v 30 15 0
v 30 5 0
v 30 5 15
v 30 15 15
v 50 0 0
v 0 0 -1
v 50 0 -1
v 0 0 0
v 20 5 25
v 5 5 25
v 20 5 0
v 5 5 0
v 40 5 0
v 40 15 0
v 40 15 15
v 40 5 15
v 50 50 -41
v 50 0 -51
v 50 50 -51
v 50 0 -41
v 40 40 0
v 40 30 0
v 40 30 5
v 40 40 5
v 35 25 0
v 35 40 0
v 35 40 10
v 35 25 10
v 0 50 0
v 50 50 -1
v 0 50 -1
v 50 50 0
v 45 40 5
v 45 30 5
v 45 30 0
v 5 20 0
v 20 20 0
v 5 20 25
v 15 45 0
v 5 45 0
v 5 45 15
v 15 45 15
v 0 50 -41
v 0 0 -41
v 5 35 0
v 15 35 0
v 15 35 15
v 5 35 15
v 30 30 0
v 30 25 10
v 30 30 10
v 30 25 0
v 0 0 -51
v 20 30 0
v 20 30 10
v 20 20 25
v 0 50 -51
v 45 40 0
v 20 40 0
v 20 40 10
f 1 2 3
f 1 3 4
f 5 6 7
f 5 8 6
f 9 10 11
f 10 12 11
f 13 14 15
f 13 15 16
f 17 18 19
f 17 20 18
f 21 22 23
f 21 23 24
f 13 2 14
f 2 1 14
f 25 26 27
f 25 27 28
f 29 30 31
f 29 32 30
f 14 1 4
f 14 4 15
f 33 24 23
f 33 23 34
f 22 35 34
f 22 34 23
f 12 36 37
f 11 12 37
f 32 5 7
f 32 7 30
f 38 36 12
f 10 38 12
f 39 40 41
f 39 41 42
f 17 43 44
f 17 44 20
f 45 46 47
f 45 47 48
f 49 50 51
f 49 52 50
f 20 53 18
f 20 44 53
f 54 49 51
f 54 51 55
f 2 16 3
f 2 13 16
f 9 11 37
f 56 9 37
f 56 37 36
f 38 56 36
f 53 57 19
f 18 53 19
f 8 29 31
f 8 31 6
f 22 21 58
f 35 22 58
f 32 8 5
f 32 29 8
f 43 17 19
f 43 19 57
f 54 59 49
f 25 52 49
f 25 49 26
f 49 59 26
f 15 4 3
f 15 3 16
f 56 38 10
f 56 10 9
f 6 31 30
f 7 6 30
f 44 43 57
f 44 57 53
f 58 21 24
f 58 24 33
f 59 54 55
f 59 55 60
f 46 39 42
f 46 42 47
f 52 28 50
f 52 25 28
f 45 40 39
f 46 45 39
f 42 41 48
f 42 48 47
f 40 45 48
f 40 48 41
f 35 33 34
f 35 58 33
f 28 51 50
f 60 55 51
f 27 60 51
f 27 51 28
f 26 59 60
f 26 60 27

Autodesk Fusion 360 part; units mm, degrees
sketch "Skizze1" plane through (0, 0, 0) normal (0, 0, 1) x (1, 0, 0)
  line L0 (0, 0) -> (50, 0)
  line L1 (50, 0) -> (50, 50)
  line L2 (50, 50) -> (0, 50)
  line L3 (0, 50) -> (0, 0)
  line L4 (20, 20) -> (5, 20)
  line L5 (5, 20) -> (5, 5)
  line L6 (5, 5) -> (20, 5)
  line L7 (20, 5) -> (20, 20)
  line L8 (20, 40) -> (35, 40)
  line L9 (35, 40) -> (35, 25)
  line L10 (35, 25) -> (30, 25)
  line L11 (30, 25) -> (30, 30)
  line L12 (30, 30) -> (20, 30)
  line L13 (20, 30) -> (20, 40)
  line L14 (5, 45) -> (15, 45)
  line L15 (15, 45) -> (15, 35)
  line L16 (15, 35) -> (5, 35)
  line L17 (5, 35) -> (5, 45)
  line L18 (30, 15) -> (40, 15)
  line L19 (40, 15) -> (40, 5)
  line L20 (40, 5) -> (30, 5)
  line L21 (30, 5) -> (30, 15)
  line L22 (40, 40) -> (45, 40)
  line L23 (45, 40) -> (45, 30)
  line L24 (45, 30) -> (40, 30)
  line L25 (40, 30) -> (40, 40)
extrude "Extrusion1" add sketch "Skizze1" along normal blind 25 contours L4 L5 L6 L7 makes body 1 in component "Großer Block"
extrude "Extrusion1'" add sketch "Skizze1" along normal blind 15 separate body contours L18 L19 L20 L21 makes body 2 in component "Medium Block 1"
extrude "Extrusion1''" add sketch "Skizze1" along normal blind 15 separate body contours L14 L15 L16 L17 makes body 3 in component "Medium Block 2#"
extrude "Extrusion1'''" add sketch "Skizze1" along normal blind 10 separate body contours L8 L9 L10 L11 L12 L13 makes body 4 in component "L Block"
extrude "Extrusion1''''" add sketch "Skizze1" along normal blind 5 separate body contours L22 L23 L24 L25 makes body 5 in component "Smal Block 1"
extrude "Extrusion1'''''" add sketch "Skizze1" against normal blind 1 separate body contours L0 L1 L2 L3 | L4 L5 L6 L7 | L8 L9 L10 L11 L12 L13 | L14 L15 L16 L17 | L18 L19 L20 L21 | L22 L23 L24 L25 makes body 6 in component "Boden"
extrude "Extrusion1''''''" add 1 faces at (16.6667, 33.3333, -1) along direction (0, 0, -1) blind 50 separate body on bodies 6 makes body 7 in component "Ground below"
extrude "Extrusion2" cut 1 faces at (16.6667, 33.3333, -1) along direction (0, 0, -1) blind 1 on bodies 7 bodies 7 in component "Ground below"
extrude "Extrusion3" cut 1 faces at (16.6667, 33.3333, -51) along direction (0, 0, 1) blind 40 from surface at 10 on bodies 7 bodies 7 in component "Ground below"
component "Großer Block" placed x (1, 0, 0) y (0, 1, 0) z (0, 0, 1) at (0, 0, 0)
component "Medium Block 1" placed x (1, 0, 0) y (0, 1, 0) z (0, 0, 1) at (0, 0, 0)
component "Medium Block 2#" placed x (1, 0, 0) y (0, 1, 0) z (0, 0, 1) at (0, 0, 0)
component "L Block" placed x (1, 0, 0) y (0, 1, 0) z (0, 0, 1) at (0, 0, 0)
component "Smal Block 1" placed x (1, 0, 0) y (0, 1, 0) z (0, 0, 1) at (0, 0, 0)
component "Boden" placed x (1, 0, 0) y (0, 1, 0) z (0, 0, 1) at (0, 0, 0)
component "Ground below" placed x (1, 0, 0) y (0, 1, 0) z (0, 0, 1) at (0, 0, 0)
equation "d21 = -h_wasser"
equation "d22 = -( a_Block - h_wasser )"
equation "h_wasser = ( 0.2 * 50 ) * 1 mm"
equation "a_Block = 50 mm"
